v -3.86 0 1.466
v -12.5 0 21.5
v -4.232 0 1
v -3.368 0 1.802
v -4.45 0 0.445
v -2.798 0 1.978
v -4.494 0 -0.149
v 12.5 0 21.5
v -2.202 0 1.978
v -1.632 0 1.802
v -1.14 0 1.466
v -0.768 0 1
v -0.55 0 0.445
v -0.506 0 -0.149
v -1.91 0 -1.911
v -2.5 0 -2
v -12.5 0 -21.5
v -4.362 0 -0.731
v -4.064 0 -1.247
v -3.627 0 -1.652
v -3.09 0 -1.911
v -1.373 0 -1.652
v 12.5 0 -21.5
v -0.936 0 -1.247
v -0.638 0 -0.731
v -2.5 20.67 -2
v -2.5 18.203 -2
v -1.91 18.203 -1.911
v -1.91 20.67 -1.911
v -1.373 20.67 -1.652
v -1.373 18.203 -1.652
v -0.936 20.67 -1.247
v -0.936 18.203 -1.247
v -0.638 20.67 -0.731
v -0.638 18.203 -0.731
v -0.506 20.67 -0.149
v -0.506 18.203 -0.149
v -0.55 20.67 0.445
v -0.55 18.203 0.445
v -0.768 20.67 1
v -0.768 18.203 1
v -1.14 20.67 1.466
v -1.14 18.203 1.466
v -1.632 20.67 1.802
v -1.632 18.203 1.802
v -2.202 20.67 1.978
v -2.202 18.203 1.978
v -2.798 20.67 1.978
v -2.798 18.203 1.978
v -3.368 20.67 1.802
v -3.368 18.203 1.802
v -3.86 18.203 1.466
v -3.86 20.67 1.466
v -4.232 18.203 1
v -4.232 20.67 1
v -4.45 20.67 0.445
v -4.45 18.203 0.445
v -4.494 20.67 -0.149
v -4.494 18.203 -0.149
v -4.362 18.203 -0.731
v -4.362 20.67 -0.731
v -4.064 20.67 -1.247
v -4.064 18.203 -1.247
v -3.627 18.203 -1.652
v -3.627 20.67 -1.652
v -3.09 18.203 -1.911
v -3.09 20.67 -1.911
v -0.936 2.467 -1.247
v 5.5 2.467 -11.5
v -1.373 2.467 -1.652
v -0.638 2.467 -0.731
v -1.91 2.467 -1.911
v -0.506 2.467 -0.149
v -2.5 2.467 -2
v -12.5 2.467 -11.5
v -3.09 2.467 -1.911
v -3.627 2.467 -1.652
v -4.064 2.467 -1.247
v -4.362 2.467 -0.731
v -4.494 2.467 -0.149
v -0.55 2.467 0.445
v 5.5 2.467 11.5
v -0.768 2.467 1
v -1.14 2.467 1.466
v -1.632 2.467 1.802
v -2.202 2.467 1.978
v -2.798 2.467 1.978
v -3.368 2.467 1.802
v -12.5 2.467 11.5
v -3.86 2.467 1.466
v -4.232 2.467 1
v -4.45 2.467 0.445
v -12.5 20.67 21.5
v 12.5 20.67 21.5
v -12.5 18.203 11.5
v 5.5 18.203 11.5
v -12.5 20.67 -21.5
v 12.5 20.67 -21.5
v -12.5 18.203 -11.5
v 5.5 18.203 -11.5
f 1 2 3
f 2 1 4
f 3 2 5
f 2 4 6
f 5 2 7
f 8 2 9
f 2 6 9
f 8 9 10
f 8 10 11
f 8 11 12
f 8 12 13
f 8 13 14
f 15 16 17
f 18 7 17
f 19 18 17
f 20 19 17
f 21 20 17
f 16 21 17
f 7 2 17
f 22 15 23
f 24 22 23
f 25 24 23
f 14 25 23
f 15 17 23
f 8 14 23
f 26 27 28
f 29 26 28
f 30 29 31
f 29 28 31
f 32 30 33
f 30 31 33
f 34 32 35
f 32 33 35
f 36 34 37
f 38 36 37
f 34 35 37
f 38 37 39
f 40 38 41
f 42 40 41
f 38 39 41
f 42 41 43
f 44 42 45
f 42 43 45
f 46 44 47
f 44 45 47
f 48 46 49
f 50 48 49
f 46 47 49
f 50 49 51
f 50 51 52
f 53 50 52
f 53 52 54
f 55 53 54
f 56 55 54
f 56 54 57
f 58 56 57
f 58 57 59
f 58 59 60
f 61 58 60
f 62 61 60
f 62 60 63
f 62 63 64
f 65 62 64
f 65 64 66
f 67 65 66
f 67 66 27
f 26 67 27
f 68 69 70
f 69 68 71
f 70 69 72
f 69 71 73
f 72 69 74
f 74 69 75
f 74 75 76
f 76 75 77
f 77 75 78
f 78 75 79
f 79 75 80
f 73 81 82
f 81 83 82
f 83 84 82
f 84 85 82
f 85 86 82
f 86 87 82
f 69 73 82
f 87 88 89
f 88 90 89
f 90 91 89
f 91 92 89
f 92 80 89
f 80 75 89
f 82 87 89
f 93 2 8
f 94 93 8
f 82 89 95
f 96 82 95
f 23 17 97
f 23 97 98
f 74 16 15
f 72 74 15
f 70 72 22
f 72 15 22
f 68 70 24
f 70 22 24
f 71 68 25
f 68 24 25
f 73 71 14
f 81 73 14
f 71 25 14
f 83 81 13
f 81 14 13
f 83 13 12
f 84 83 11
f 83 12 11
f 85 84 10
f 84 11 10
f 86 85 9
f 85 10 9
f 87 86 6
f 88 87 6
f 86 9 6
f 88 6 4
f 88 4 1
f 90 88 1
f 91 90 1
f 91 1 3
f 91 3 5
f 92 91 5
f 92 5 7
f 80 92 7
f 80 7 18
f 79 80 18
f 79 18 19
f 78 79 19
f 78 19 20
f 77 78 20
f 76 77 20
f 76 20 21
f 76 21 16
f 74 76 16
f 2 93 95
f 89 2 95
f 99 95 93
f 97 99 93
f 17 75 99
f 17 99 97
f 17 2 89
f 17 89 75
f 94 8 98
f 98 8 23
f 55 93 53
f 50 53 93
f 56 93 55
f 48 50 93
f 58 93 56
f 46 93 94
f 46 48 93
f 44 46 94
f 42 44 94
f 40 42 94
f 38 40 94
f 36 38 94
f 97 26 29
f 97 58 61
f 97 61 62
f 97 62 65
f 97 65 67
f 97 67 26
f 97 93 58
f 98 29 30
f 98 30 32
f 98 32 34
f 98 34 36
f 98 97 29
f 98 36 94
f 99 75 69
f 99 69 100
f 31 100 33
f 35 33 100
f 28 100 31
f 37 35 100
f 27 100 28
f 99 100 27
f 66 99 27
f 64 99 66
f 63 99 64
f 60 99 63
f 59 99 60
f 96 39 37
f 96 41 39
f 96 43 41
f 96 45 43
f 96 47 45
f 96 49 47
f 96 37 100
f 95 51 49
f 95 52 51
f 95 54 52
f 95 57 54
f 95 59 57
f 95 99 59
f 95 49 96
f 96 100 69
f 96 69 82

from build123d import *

# Parameters (mm, degrees)
SKETCH1_W           = 25
SKETCH1_H           = 43
BOSS_EXTRUDE1_DEPTH = 20.67
SKETCH2_W           = 23
SKETCH2_H           = 15.735859414
CUT_EXTRUDE1_DEPTH  = 18
SKETCH3_R           = 2
CUT_EXTRUDE2_DEPTH  = 33.338041066


with BuildPart() as part:
    # Sketch1 → Boss-Extrude1 (new body)
    with BuildSketch(Plane(origin=(0, 0, 0), x_dir=(1, 0, 0), z_dir=(0, 1, 0))):
        Rectangle(SKETCH1_W, SKETCH1_H)
    extrude(amount=BOSS_EXTRUDE1_DEPTH)

    # Sketch2 → Cut-Extrude1 (cut)
    with BuildSketch(Plane.ZY.offset(12.5)):
        with Locations((0, 10.335)):
            Rectangle(SKETCH2_W, SKETCH2_H)
    extrude(amount=-CUT_EXTRUDE1_DEPTH, mode=Mode.SUBTRACT)

    # Sketch3 → Cut-Extrude2 (cut, through all)
    with BuildSketch(Plane.XZ):
        with Locations(Location((-2.5, 0, 0), (0, 0, 270))):
            Circle(SKETCH3_R)
    extrude(amount=-CUT_EXTRUDE2_DEPTH, mode=Mode.SUBTRACT)


solid = part.part
